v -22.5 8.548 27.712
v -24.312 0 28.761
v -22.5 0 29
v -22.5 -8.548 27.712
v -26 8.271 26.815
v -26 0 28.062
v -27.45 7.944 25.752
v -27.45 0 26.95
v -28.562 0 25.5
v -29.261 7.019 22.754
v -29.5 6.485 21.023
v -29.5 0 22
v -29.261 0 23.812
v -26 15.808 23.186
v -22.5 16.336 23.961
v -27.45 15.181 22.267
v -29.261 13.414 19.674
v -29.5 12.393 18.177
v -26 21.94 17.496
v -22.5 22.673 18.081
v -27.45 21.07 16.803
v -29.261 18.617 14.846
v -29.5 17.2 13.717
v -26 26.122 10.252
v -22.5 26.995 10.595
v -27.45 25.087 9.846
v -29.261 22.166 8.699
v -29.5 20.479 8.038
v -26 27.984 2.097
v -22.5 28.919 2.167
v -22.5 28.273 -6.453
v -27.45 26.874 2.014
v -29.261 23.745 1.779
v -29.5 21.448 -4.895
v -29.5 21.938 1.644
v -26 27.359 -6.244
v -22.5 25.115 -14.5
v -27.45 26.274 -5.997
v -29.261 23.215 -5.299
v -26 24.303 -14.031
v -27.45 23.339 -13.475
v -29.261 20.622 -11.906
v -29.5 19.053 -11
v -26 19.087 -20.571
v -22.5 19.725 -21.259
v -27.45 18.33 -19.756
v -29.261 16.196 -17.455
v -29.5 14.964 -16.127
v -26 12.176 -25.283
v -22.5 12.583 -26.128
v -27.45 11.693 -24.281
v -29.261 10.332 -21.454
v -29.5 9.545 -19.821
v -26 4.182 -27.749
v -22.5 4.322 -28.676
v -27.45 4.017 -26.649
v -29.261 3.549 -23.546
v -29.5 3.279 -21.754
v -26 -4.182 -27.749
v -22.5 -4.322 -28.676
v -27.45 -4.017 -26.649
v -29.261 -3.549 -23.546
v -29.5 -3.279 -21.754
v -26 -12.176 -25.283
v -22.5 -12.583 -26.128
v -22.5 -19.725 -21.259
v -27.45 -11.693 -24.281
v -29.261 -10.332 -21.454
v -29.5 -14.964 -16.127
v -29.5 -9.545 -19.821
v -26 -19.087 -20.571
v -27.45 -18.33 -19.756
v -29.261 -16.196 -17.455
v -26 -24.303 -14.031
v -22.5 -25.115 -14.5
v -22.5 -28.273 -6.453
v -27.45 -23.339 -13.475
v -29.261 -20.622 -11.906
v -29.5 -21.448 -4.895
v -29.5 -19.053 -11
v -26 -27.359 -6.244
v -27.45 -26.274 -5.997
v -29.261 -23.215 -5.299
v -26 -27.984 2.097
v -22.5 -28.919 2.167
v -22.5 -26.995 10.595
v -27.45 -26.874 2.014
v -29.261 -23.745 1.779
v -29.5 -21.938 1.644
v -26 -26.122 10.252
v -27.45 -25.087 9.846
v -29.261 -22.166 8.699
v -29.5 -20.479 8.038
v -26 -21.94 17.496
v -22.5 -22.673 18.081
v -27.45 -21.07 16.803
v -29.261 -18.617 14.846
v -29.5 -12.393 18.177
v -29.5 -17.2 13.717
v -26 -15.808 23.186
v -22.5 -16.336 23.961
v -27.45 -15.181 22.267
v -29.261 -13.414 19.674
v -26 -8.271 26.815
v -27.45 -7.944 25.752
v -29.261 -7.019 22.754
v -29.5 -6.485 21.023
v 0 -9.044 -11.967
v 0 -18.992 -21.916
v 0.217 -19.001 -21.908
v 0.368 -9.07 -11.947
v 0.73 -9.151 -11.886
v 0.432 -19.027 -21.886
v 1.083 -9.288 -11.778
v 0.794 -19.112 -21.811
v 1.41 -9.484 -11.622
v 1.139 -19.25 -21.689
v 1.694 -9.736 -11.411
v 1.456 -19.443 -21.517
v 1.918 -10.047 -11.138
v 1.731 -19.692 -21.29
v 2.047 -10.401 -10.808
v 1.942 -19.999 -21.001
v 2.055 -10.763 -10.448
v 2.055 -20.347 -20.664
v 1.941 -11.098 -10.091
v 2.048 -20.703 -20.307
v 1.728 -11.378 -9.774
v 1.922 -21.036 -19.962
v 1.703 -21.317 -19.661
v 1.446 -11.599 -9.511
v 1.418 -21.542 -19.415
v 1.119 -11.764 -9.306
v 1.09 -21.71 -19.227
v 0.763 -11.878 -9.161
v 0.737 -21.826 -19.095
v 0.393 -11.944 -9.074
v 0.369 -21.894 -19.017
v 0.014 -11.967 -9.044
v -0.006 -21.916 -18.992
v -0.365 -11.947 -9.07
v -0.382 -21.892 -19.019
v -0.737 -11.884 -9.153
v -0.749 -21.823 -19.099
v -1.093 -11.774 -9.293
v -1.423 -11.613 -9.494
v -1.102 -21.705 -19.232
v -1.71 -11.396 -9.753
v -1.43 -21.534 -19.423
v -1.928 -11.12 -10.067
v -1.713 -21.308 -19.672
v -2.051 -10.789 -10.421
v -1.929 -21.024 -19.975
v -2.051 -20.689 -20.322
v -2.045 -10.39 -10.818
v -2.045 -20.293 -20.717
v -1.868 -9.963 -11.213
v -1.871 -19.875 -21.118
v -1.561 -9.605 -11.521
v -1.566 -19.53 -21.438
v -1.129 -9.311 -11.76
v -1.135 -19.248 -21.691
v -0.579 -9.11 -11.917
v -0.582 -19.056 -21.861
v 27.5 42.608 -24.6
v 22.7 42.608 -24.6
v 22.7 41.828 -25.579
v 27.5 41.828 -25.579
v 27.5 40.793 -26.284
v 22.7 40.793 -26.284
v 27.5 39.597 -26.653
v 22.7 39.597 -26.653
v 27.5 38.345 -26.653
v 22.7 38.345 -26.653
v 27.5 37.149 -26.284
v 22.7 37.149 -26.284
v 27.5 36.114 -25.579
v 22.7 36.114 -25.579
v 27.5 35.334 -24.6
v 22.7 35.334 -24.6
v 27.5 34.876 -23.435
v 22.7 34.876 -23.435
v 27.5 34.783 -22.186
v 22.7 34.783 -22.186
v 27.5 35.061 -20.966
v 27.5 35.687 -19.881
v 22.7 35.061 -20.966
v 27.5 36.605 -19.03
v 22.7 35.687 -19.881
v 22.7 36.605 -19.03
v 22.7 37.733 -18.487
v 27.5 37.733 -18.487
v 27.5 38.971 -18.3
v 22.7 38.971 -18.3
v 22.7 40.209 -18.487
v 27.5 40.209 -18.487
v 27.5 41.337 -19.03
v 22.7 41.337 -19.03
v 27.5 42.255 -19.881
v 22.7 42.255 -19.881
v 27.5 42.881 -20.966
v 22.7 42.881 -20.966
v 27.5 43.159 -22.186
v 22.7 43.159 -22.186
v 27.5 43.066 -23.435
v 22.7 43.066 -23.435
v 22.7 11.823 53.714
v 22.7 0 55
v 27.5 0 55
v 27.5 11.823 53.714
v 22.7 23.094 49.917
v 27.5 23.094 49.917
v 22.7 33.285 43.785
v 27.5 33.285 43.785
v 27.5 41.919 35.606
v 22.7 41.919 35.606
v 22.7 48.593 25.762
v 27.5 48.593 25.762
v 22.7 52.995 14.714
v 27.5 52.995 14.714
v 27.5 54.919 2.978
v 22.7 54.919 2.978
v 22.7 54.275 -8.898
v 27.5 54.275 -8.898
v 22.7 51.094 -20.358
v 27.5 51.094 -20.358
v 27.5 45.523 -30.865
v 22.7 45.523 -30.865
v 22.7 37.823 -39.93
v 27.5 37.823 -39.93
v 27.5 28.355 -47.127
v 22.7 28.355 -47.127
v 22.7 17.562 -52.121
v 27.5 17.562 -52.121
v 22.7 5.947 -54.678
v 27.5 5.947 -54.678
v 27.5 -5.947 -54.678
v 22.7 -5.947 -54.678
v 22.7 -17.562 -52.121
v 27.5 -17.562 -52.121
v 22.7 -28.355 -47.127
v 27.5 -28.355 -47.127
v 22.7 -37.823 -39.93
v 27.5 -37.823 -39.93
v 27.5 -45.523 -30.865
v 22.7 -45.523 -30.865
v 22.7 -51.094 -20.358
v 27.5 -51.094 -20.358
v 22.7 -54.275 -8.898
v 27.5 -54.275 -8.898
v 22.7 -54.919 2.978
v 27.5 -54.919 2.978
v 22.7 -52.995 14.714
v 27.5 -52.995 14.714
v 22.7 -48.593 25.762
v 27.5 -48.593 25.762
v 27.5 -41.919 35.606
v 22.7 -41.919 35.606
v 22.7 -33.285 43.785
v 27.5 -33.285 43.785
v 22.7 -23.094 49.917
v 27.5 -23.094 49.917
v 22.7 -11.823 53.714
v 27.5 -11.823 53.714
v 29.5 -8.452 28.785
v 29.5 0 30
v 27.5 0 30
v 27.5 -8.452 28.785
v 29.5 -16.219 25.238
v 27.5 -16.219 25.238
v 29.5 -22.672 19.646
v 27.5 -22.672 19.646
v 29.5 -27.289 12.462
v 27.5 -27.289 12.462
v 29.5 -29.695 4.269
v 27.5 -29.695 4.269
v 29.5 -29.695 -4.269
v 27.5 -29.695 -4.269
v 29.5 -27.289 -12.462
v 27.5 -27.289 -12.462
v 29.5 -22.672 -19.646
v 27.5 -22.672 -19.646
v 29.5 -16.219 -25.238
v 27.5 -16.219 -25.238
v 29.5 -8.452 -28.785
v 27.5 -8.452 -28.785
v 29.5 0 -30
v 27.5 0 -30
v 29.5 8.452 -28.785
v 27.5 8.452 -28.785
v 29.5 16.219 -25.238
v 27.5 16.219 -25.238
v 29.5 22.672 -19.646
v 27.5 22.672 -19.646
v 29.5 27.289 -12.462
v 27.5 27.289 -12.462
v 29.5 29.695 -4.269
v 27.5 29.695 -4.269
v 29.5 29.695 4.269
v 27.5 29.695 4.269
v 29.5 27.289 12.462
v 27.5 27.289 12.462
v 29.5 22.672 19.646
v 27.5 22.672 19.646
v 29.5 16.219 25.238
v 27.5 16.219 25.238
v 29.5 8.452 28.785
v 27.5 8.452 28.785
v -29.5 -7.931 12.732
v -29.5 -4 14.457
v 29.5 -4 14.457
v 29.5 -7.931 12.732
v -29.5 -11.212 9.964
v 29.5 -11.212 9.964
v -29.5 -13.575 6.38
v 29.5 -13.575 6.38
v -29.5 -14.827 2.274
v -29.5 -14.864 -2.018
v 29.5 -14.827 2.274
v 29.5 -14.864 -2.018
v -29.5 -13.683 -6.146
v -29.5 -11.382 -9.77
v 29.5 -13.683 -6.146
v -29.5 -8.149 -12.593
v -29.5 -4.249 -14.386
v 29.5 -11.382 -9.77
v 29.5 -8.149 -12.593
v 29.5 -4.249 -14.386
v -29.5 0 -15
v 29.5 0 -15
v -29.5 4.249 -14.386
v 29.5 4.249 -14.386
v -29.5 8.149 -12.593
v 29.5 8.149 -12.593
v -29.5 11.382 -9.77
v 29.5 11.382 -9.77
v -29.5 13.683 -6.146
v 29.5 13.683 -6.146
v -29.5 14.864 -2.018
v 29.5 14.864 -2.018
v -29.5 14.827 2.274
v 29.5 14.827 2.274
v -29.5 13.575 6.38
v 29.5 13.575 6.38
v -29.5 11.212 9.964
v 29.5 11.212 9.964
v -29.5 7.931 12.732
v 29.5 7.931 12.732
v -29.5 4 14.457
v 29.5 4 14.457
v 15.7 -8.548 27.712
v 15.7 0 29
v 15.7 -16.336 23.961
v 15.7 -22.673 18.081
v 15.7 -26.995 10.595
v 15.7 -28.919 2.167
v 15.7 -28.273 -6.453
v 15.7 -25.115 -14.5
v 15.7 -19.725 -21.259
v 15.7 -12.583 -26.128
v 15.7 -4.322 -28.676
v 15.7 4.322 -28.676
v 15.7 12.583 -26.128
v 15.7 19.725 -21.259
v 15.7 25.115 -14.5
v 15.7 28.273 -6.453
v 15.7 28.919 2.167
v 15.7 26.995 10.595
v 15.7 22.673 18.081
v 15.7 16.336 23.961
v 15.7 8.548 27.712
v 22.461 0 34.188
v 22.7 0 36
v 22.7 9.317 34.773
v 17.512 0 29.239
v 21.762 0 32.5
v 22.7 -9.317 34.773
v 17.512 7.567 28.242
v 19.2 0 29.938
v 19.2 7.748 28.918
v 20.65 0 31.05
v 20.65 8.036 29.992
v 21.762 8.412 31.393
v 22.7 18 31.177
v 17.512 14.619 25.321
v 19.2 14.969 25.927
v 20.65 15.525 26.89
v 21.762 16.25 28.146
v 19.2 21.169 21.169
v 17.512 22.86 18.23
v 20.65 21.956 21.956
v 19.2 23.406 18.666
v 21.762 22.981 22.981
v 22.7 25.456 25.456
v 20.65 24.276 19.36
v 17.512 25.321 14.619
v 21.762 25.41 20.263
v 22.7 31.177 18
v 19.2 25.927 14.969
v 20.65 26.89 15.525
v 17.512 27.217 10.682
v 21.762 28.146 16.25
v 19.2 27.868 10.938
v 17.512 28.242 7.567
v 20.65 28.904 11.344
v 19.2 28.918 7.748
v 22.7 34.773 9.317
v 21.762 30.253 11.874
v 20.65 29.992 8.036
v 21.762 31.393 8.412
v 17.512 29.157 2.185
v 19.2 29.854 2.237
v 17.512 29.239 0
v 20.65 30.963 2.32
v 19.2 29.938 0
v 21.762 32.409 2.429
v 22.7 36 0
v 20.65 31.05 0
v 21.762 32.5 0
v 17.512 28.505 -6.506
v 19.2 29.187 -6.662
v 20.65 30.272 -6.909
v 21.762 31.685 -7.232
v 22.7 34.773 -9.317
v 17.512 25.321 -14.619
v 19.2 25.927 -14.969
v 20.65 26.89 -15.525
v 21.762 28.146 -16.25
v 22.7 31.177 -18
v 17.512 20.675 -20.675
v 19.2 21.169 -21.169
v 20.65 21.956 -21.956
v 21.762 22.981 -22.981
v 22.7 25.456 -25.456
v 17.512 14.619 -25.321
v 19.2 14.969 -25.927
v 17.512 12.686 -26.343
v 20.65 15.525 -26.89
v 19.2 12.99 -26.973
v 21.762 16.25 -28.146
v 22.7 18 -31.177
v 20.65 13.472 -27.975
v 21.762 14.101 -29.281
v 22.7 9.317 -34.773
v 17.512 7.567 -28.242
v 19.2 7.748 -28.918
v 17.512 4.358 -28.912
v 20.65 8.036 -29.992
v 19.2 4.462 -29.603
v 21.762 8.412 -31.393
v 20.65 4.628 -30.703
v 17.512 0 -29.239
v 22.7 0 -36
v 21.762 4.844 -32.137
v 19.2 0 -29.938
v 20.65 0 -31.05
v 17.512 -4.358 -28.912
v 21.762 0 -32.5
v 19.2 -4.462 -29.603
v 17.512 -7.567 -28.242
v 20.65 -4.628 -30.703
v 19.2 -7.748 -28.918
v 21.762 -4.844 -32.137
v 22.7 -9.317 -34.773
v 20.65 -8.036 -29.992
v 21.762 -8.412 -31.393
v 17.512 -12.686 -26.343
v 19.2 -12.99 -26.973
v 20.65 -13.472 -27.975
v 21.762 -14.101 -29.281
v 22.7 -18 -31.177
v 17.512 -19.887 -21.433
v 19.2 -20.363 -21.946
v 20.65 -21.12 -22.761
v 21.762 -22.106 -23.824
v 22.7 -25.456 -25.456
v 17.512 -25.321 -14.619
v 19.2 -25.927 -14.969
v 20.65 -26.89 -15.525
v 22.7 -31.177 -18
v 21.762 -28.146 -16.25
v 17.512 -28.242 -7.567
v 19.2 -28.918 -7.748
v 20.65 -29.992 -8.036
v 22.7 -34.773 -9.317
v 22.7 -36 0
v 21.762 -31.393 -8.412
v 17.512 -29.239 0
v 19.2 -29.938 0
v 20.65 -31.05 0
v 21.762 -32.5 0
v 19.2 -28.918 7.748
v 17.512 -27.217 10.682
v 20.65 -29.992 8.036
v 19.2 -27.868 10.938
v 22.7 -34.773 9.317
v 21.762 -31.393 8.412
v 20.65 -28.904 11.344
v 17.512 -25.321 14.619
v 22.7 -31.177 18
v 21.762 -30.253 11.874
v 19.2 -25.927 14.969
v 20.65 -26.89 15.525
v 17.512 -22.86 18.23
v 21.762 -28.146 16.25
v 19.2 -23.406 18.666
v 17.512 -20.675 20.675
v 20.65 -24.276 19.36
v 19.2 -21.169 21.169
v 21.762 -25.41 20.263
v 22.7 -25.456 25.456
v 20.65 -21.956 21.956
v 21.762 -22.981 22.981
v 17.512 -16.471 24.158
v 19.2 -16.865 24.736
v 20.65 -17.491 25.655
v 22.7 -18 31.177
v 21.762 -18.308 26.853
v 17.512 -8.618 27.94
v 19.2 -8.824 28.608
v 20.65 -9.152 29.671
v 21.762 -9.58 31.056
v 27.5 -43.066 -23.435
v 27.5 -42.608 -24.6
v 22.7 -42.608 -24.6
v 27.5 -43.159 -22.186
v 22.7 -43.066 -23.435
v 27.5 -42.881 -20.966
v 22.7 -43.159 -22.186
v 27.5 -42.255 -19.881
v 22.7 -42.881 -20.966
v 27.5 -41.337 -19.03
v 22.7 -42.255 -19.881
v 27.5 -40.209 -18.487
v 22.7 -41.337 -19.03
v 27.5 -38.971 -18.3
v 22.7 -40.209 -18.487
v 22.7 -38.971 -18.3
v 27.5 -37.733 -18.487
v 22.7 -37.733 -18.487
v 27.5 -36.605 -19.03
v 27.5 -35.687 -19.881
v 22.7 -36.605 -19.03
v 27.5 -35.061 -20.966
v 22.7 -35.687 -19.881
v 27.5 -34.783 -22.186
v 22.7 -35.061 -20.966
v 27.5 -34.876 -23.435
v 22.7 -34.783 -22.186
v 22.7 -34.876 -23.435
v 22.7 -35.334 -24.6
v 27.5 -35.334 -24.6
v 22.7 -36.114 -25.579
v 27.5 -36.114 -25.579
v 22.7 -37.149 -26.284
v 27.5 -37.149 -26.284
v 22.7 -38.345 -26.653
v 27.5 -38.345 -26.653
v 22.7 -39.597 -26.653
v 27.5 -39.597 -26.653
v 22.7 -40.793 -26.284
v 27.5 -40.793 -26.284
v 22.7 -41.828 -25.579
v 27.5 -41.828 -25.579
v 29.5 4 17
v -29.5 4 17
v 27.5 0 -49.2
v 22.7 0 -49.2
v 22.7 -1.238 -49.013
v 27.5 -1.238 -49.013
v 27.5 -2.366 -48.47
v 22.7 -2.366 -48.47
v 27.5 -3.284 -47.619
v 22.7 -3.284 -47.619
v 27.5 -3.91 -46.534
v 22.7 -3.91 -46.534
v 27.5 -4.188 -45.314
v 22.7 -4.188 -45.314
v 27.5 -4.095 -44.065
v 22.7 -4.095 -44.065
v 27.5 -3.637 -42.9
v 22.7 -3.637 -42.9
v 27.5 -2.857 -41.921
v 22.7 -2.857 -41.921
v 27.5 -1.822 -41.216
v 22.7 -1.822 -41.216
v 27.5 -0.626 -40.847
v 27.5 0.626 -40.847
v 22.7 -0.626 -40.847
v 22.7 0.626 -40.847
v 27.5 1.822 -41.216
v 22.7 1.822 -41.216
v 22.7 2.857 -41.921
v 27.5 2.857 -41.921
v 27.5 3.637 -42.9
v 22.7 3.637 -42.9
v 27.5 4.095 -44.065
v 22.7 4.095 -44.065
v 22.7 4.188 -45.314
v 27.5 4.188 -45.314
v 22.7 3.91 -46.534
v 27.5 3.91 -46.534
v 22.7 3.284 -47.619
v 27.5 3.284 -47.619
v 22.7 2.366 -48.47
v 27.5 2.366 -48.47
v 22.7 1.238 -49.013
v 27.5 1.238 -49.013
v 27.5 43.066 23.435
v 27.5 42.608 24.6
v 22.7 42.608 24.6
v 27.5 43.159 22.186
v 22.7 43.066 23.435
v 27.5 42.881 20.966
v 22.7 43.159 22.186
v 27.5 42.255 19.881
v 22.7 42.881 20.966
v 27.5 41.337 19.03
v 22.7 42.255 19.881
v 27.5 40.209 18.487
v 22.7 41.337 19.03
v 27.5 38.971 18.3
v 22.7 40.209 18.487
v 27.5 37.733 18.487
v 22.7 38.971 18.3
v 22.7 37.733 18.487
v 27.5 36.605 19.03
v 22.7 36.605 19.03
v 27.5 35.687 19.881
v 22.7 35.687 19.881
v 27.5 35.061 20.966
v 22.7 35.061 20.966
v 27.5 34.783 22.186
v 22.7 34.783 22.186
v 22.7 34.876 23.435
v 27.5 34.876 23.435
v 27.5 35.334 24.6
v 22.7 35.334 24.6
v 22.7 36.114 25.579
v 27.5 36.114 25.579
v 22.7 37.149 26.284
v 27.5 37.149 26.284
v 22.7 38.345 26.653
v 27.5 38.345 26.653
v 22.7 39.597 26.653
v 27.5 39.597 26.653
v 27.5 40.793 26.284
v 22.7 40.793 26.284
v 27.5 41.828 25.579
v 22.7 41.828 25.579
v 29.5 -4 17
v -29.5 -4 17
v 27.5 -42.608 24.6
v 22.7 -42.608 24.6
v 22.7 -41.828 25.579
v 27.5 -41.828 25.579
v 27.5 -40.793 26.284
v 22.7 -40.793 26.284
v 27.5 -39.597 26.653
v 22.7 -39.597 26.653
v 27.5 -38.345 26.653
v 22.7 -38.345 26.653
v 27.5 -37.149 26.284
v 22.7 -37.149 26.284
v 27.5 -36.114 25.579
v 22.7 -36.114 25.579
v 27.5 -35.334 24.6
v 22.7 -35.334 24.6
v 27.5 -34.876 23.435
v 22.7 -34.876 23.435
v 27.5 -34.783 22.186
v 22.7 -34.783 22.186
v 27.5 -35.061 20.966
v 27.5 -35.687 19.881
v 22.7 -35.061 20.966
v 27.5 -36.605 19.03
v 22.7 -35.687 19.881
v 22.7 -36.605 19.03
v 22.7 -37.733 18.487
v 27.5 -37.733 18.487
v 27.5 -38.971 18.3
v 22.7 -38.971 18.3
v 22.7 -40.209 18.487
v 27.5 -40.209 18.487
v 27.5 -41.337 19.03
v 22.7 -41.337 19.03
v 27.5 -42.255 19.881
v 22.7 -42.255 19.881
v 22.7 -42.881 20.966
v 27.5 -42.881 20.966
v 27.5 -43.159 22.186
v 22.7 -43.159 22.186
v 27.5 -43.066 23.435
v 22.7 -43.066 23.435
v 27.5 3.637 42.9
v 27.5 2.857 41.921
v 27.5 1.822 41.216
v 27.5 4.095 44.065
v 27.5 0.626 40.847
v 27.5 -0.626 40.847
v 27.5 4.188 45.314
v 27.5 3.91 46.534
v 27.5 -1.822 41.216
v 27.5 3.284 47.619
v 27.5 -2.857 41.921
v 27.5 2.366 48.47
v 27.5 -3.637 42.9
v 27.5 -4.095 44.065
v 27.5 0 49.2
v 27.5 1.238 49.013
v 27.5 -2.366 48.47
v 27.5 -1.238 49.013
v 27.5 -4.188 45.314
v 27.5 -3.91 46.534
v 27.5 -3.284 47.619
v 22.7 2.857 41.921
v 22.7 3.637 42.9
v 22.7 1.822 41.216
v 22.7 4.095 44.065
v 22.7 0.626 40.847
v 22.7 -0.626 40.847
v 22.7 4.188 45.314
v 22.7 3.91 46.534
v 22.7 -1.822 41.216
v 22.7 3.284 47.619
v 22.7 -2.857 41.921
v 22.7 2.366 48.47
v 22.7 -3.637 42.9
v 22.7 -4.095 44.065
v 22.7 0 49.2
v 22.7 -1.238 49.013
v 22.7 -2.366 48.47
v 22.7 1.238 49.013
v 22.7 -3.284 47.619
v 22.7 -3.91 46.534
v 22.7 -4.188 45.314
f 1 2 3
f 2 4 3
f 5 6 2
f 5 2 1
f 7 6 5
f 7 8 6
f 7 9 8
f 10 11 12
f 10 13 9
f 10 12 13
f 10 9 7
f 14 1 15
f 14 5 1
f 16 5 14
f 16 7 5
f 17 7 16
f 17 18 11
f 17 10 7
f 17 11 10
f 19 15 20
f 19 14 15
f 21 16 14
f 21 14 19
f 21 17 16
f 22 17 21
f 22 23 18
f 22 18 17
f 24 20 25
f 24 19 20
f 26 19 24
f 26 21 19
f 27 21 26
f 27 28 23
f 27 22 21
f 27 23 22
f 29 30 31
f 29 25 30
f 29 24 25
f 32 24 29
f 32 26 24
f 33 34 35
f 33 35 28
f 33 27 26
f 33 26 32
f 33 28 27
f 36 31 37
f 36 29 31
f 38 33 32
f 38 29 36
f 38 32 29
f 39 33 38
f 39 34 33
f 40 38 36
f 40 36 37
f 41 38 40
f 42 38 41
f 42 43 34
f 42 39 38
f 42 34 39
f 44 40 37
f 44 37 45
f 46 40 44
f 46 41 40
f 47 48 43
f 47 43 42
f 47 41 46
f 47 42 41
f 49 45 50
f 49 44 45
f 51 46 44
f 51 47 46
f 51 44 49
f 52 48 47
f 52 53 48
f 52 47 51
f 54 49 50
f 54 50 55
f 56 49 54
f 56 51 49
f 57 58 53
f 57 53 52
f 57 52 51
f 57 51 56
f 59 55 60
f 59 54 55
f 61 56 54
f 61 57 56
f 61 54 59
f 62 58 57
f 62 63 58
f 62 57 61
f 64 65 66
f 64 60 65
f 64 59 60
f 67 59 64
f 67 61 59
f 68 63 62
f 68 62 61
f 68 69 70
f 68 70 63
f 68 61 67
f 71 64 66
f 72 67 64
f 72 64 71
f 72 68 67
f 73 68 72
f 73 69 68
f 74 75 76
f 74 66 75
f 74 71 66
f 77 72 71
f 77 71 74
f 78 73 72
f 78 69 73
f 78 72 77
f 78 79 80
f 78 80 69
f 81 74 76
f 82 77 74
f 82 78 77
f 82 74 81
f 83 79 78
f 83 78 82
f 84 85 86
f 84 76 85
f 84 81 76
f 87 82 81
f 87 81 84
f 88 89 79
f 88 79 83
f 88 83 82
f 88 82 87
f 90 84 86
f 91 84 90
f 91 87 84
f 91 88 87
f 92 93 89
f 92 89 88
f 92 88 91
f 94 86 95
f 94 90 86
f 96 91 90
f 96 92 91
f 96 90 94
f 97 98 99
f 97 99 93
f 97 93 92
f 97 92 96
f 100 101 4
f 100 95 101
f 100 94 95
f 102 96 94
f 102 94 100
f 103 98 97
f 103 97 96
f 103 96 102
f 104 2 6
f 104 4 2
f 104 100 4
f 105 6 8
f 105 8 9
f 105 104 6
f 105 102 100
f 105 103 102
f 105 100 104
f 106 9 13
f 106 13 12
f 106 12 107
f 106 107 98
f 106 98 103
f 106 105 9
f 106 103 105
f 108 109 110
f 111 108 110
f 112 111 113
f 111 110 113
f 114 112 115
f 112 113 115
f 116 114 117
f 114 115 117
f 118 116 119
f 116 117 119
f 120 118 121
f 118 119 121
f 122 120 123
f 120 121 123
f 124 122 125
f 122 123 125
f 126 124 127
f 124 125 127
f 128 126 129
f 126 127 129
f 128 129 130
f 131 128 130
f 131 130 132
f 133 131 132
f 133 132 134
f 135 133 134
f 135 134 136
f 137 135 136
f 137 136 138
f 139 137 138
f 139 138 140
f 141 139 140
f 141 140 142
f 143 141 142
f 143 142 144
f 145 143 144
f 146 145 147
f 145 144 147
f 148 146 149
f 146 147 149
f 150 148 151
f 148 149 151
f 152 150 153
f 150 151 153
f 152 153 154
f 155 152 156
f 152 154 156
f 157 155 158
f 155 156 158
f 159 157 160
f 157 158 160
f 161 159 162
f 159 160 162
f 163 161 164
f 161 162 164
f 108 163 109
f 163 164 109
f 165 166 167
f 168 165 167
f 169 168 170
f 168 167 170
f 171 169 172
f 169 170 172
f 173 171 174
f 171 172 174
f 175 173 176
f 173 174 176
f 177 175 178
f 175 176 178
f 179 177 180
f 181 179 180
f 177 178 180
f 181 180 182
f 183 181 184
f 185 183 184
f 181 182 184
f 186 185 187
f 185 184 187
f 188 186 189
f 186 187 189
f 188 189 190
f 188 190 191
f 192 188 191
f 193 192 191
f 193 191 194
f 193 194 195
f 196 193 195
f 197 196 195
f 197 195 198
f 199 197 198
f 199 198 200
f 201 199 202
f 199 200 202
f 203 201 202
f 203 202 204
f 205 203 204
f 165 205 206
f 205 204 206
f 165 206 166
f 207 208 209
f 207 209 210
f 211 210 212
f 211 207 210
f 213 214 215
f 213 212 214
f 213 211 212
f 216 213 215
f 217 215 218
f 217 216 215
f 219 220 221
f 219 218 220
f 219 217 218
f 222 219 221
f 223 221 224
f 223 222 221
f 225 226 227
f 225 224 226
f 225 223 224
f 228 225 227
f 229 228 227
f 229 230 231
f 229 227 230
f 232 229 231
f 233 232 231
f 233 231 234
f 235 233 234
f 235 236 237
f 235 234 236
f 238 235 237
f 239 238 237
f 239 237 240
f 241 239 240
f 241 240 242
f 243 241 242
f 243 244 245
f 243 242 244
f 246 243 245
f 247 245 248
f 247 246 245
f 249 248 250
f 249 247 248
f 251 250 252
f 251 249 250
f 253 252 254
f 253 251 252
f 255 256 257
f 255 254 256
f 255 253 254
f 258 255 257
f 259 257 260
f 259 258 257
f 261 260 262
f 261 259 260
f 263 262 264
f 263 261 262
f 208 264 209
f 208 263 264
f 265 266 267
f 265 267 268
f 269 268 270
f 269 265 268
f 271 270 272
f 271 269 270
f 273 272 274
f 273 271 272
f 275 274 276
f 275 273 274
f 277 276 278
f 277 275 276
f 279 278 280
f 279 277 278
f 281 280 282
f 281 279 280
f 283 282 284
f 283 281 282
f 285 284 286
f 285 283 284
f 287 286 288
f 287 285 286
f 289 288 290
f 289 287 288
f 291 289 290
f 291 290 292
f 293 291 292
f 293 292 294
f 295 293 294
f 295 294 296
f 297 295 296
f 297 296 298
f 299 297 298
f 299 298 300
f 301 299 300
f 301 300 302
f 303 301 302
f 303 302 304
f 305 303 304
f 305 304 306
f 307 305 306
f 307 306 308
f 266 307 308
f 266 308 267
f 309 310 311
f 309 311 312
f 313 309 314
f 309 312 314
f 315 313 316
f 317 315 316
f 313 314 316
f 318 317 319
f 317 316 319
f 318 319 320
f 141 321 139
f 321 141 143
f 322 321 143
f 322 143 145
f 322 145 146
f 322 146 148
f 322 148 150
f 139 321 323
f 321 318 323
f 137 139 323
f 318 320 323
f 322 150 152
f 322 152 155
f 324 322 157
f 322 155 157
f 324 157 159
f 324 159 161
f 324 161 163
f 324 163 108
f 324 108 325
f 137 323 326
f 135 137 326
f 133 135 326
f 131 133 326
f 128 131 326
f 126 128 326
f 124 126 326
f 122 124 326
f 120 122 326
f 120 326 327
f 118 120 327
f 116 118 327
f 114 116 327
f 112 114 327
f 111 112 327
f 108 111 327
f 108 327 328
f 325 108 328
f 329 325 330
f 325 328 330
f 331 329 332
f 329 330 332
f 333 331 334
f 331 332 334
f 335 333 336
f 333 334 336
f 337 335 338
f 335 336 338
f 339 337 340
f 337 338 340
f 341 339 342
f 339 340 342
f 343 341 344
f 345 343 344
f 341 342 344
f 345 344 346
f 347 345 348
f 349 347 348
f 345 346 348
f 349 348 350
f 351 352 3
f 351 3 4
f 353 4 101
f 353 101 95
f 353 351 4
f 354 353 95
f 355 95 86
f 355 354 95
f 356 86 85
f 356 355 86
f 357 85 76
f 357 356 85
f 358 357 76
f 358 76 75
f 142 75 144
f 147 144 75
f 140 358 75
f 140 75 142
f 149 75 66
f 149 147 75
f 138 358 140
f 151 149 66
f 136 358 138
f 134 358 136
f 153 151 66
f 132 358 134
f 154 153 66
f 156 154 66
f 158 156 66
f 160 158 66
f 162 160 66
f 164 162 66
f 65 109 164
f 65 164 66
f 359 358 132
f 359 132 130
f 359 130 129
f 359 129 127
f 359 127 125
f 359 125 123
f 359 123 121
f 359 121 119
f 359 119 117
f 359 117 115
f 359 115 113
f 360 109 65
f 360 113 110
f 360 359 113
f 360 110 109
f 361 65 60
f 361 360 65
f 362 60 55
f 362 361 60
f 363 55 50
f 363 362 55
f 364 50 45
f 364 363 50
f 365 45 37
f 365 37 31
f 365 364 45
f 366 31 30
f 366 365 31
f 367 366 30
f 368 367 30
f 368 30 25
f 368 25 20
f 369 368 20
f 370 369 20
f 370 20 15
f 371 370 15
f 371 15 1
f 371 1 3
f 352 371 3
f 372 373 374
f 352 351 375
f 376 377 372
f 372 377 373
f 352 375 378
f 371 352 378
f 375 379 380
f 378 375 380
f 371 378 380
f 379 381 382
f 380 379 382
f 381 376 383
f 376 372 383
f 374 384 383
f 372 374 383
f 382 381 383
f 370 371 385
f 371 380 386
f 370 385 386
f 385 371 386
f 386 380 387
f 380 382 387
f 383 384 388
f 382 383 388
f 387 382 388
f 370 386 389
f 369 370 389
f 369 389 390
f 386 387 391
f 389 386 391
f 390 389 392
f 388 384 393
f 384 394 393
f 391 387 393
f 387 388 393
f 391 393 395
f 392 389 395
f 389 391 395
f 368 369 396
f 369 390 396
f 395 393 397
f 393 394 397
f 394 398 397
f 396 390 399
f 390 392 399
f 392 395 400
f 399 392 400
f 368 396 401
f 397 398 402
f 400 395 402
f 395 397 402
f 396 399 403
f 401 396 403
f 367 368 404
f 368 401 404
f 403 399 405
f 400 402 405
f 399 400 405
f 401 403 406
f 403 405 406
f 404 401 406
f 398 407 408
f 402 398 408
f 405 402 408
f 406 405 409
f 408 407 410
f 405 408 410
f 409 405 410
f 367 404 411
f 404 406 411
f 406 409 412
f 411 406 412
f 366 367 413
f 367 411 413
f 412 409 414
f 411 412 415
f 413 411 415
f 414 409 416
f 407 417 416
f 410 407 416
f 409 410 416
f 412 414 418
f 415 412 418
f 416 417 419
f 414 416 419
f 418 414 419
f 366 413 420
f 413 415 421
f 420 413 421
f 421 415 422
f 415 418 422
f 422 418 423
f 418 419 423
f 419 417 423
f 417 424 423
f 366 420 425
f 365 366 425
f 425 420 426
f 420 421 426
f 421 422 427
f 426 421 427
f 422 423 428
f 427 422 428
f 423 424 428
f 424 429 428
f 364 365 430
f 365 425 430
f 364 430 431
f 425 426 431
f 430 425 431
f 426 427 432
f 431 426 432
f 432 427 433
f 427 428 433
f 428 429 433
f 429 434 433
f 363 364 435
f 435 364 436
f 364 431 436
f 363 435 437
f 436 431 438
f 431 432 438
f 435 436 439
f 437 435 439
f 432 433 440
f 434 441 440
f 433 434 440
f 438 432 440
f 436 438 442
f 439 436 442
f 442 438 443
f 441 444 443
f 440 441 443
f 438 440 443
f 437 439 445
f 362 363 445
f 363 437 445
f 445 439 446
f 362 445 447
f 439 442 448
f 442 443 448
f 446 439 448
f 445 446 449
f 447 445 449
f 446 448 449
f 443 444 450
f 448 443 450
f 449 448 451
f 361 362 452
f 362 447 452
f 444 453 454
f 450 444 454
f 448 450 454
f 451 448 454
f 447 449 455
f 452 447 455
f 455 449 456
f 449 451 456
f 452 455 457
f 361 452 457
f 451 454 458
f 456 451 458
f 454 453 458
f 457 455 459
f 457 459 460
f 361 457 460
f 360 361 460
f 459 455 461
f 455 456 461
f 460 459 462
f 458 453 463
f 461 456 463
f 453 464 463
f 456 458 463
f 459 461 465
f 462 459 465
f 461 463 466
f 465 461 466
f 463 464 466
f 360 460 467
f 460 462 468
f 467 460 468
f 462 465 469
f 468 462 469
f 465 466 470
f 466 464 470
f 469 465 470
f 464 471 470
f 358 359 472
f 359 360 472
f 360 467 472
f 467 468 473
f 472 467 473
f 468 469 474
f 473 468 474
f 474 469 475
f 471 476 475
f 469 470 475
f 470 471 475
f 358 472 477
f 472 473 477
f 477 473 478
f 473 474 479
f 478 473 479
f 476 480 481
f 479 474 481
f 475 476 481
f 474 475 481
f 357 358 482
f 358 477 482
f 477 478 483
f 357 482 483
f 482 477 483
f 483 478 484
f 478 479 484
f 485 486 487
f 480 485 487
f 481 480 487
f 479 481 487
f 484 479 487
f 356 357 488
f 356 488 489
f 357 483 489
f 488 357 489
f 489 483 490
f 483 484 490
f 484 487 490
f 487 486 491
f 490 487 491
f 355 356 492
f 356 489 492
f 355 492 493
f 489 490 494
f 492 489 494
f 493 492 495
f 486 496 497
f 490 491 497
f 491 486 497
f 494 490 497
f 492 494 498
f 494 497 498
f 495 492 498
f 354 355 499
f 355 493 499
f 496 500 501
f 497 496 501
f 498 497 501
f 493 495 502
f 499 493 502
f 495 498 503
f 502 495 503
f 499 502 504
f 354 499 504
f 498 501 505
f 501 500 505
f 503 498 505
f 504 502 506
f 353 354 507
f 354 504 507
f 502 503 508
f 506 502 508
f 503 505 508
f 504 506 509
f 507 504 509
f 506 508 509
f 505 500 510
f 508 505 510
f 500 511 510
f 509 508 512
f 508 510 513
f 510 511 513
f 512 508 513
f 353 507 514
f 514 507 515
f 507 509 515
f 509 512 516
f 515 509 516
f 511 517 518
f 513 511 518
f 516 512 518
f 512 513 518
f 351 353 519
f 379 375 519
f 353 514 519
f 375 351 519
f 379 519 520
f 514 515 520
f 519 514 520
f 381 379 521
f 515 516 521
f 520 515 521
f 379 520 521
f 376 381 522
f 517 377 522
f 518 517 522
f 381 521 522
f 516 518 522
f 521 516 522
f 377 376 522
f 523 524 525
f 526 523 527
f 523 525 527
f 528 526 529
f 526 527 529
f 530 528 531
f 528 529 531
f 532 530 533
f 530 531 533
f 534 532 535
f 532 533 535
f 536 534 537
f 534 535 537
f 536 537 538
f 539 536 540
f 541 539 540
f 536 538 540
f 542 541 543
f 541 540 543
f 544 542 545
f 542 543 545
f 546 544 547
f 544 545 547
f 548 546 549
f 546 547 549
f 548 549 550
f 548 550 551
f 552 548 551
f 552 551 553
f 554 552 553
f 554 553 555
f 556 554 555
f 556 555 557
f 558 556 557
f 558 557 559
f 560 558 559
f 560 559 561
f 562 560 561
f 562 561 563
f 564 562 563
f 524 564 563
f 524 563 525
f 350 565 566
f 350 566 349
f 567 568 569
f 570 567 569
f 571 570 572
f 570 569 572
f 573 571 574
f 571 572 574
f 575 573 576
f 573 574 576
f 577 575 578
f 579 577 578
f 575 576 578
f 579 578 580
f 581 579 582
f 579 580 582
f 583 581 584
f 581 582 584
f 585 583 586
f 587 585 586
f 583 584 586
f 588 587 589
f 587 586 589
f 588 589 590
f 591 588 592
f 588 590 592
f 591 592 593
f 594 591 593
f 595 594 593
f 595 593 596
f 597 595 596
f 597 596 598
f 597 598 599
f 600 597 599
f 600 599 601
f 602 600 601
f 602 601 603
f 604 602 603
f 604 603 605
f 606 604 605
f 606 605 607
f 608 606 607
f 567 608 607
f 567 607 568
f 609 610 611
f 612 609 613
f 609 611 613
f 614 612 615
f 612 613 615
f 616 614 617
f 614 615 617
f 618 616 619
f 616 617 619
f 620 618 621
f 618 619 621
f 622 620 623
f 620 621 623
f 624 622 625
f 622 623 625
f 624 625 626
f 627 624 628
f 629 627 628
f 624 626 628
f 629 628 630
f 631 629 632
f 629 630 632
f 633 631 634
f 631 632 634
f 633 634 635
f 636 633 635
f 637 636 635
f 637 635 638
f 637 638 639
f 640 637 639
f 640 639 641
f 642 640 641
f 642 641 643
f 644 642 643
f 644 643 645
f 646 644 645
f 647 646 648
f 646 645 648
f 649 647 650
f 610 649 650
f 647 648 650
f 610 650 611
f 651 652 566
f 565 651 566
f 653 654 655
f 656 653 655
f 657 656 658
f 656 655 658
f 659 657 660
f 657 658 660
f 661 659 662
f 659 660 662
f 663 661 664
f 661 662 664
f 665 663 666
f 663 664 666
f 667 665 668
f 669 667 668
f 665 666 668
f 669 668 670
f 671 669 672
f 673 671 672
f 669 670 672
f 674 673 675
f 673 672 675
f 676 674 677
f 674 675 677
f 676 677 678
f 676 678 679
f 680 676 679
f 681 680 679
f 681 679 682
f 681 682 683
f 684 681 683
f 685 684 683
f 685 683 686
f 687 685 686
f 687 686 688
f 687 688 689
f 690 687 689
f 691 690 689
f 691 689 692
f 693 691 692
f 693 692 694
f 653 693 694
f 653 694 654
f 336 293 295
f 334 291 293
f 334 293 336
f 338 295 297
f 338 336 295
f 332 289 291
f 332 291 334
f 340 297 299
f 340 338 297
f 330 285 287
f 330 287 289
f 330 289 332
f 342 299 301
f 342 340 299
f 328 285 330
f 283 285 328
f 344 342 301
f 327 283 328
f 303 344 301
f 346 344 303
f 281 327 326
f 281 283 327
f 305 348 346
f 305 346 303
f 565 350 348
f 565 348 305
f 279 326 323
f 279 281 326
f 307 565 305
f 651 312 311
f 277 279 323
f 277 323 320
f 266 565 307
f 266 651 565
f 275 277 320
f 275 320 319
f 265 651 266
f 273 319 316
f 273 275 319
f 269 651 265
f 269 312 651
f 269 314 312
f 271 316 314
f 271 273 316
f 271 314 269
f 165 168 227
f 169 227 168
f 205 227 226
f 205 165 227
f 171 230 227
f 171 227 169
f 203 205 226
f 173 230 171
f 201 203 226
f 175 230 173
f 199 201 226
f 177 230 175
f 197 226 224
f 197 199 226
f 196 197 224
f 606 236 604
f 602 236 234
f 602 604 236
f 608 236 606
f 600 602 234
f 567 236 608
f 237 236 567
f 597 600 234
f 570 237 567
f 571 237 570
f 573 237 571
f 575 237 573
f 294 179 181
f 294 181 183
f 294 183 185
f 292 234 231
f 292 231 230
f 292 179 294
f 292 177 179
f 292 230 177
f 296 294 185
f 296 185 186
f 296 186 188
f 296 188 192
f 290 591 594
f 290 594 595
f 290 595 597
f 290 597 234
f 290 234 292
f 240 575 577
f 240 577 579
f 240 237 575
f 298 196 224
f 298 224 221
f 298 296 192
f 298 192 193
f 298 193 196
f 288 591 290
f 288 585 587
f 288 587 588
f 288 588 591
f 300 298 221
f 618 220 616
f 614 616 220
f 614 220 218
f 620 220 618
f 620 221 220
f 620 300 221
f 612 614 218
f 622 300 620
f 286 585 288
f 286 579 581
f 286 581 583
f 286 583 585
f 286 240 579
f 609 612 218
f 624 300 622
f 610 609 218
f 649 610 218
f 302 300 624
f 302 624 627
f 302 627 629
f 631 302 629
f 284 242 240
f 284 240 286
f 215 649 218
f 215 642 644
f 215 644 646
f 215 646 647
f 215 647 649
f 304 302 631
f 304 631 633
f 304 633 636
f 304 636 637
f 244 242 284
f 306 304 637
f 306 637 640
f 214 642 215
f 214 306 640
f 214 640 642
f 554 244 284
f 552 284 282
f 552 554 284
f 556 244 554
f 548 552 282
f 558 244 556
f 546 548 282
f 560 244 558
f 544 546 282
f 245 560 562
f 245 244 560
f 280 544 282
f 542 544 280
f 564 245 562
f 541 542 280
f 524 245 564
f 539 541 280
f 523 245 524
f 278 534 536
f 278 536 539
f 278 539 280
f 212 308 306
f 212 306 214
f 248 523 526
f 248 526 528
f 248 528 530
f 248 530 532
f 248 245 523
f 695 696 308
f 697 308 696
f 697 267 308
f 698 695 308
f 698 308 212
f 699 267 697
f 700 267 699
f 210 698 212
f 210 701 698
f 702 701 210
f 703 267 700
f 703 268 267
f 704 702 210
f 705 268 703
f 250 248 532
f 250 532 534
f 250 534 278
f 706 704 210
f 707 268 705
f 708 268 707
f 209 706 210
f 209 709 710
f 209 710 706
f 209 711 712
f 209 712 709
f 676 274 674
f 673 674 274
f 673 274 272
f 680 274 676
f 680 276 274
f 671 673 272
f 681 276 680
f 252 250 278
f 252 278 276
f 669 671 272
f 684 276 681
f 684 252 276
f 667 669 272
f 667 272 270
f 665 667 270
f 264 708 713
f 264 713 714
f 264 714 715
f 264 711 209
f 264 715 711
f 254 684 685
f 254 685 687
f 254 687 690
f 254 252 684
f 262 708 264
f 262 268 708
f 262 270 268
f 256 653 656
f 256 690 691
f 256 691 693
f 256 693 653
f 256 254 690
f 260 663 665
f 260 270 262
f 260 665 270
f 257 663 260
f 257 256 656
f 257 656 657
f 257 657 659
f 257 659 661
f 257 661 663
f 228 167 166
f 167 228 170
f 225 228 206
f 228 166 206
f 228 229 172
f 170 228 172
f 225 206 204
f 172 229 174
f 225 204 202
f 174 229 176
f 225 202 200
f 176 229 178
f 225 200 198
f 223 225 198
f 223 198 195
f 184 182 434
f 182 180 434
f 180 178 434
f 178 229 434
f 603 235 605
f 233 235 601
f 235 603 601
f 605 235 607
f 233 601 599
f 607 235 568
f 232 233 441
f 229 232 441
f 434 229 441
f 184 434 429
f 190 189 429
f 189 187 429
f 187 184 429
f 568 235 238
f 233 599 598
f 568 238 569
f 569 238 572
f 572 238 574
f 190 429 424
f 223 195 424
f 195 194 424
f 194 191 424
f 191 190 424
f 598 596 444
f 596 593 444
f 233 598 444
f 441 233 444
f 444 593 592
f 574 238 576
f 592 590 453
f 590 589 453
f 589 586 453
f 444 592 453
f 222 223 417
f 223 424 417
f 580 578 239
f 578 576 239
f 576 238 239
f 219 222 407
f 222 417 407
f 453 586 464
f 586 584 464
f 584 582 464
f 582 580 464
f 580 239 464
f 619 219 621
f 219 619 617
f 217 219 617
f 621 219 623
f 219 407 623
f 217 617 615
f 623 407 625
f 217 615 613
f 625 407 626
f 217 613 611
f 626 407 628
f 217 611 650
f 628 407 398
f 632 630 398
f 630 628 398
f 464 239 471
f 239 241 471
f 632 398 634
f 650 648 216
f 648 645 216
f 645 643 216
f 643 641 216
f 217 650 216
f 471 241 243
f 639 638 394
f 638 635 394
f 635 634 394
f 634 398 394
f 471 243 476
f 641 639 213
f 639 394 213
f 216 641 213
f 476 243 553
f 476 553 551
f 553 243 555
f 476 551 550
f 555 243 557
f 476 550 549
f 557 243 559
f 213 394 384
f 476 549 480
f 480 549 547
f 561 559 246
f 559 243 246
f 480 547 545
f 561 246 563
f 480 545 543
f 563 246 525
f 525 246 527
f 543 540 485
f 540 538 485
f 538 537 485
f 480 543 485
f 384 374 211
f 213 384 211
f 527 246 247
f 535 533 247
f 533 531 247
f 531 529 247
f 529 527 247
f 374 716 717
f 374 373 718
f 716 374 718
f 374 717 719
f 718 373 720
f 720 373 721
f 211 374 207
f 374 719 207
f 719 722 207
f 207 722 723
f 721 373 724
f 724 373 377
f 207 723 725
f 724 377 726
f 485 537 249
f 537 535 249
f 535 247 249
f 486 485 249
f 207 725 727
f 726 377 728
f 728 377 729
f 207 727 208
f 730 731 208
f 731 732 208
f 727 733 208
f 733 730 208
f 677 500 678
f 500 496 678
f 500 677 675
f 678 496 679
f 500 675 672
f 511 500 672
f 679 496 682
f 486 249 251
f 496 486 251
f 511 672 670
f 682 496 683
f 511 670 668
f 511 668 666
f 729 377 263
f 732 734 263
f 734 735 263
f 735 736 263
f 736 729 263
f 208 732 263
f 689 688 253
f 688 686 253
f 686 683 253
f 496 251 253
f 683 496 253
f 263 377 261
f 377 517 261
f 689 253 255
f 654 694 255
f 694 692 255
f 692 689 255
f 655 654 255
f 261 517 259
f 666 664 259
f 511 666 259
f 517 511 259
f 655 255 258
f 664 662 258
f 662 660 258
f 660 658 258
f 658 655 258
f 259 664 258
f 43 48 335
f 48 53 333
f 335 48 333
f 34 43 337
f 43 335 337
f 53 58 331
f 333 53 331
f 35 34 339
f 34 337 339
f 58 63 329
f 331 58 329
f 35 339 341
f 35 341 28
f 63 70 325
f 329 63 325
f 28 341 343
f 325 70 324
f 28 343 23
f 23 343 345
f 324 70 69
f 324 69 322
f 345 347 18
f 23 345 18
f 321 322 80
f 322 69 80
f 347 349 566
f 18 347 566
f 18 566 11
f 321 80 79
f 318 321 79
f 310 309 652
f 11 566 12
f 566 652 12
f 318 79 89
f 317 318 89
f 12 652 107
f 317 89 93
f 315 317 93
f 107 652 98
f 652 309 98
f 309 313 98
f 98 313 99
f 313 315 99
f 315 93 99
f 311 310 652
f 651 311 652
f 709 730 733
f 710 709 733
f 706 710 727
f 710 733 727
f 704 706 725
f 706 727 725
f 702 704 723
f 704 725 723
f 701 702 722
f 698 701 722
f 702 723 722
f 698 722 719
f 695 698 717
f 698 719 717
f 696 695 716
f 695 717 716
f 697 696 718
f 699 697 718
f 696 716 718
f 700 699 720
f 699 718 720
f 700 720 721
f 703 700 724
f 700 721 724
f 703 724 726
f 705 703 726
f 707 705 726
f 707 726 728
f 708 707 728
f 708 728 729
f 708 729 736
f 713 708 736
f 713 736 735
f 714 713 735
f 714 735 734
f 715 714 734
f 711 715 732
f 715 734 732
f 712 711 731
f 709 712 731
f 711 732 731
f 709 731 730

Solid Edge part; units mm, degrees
sketch "Sketch1" plane through (0, 0, 0) normal (0, -1, 0) x (1, 0, 0)
  line L0 (29.5, 30) -> (29.5, 15)
  line L1 (-29.5, 15) -> (29.5, 15)
  line L2 (-29.5, 29) -> (-29.5, 15)
  line L3 (-29.5, 29) -> (22.7, 29)
  line L4 (22.7, 55) -> (22.7, 29)
  line L5 (27.5, 55) -> (22.7, 55)
  line L6 (27.5, 30) -> (27.5, 55)
  line L7 (27.5, 30) -> (29.5, 30)
  dimension "D1" = 14
  dimension "D2" = 4.8
  dimension "D3" = 55
  dimension "D4" = 2
  dimension "D5" = 15
  dimension "D6" = 59
  dimension "D7" = 15
revolve "RevolvedProtrusion1" add sketch "Sketch1" angle 360 about axis through (-60, 0, 0) along (1, 0, 0)
sketch "Sketch2" plane through (-29.5, 0, 0) normal (-1, 0, 0) x (0, -1, 0)
  line L0 (-4, 14) -> (4, 14)
  line L1 (4, 14) -> (4, 17)
  line L2 (4, 17) -> (-4, 17)
  line L3 (-4, 17) -> (-4, 14)
  dimension "D1" = 3
  dimension "D2" = 8
  dimension "D3" = 14
extrude "Cutout1" cut sketch "Sketch2" against normal through all
hole "Hole1" at (22.7, 0, 45) direction (1, 0, 0) diameter 8.4 end up to next
hole "Hole_5" at (0, -20.5061, -20.5061) direction (0, 0.7071, 0.7071) diameter 4.134 end up to next thread major 5 thread length 2
pattern_circular "Pattern1" count 6 over 360 about axis through (22.7, 0, 0) along (1, 0, 0) of "Hole1"
fillet "Round_1" radius 7 1 edges at (22.7, 0, -29)
fillet "Round_2" radius 7 1 edges at (-29.5, 0, -29)
properties material "Stainless steel"
